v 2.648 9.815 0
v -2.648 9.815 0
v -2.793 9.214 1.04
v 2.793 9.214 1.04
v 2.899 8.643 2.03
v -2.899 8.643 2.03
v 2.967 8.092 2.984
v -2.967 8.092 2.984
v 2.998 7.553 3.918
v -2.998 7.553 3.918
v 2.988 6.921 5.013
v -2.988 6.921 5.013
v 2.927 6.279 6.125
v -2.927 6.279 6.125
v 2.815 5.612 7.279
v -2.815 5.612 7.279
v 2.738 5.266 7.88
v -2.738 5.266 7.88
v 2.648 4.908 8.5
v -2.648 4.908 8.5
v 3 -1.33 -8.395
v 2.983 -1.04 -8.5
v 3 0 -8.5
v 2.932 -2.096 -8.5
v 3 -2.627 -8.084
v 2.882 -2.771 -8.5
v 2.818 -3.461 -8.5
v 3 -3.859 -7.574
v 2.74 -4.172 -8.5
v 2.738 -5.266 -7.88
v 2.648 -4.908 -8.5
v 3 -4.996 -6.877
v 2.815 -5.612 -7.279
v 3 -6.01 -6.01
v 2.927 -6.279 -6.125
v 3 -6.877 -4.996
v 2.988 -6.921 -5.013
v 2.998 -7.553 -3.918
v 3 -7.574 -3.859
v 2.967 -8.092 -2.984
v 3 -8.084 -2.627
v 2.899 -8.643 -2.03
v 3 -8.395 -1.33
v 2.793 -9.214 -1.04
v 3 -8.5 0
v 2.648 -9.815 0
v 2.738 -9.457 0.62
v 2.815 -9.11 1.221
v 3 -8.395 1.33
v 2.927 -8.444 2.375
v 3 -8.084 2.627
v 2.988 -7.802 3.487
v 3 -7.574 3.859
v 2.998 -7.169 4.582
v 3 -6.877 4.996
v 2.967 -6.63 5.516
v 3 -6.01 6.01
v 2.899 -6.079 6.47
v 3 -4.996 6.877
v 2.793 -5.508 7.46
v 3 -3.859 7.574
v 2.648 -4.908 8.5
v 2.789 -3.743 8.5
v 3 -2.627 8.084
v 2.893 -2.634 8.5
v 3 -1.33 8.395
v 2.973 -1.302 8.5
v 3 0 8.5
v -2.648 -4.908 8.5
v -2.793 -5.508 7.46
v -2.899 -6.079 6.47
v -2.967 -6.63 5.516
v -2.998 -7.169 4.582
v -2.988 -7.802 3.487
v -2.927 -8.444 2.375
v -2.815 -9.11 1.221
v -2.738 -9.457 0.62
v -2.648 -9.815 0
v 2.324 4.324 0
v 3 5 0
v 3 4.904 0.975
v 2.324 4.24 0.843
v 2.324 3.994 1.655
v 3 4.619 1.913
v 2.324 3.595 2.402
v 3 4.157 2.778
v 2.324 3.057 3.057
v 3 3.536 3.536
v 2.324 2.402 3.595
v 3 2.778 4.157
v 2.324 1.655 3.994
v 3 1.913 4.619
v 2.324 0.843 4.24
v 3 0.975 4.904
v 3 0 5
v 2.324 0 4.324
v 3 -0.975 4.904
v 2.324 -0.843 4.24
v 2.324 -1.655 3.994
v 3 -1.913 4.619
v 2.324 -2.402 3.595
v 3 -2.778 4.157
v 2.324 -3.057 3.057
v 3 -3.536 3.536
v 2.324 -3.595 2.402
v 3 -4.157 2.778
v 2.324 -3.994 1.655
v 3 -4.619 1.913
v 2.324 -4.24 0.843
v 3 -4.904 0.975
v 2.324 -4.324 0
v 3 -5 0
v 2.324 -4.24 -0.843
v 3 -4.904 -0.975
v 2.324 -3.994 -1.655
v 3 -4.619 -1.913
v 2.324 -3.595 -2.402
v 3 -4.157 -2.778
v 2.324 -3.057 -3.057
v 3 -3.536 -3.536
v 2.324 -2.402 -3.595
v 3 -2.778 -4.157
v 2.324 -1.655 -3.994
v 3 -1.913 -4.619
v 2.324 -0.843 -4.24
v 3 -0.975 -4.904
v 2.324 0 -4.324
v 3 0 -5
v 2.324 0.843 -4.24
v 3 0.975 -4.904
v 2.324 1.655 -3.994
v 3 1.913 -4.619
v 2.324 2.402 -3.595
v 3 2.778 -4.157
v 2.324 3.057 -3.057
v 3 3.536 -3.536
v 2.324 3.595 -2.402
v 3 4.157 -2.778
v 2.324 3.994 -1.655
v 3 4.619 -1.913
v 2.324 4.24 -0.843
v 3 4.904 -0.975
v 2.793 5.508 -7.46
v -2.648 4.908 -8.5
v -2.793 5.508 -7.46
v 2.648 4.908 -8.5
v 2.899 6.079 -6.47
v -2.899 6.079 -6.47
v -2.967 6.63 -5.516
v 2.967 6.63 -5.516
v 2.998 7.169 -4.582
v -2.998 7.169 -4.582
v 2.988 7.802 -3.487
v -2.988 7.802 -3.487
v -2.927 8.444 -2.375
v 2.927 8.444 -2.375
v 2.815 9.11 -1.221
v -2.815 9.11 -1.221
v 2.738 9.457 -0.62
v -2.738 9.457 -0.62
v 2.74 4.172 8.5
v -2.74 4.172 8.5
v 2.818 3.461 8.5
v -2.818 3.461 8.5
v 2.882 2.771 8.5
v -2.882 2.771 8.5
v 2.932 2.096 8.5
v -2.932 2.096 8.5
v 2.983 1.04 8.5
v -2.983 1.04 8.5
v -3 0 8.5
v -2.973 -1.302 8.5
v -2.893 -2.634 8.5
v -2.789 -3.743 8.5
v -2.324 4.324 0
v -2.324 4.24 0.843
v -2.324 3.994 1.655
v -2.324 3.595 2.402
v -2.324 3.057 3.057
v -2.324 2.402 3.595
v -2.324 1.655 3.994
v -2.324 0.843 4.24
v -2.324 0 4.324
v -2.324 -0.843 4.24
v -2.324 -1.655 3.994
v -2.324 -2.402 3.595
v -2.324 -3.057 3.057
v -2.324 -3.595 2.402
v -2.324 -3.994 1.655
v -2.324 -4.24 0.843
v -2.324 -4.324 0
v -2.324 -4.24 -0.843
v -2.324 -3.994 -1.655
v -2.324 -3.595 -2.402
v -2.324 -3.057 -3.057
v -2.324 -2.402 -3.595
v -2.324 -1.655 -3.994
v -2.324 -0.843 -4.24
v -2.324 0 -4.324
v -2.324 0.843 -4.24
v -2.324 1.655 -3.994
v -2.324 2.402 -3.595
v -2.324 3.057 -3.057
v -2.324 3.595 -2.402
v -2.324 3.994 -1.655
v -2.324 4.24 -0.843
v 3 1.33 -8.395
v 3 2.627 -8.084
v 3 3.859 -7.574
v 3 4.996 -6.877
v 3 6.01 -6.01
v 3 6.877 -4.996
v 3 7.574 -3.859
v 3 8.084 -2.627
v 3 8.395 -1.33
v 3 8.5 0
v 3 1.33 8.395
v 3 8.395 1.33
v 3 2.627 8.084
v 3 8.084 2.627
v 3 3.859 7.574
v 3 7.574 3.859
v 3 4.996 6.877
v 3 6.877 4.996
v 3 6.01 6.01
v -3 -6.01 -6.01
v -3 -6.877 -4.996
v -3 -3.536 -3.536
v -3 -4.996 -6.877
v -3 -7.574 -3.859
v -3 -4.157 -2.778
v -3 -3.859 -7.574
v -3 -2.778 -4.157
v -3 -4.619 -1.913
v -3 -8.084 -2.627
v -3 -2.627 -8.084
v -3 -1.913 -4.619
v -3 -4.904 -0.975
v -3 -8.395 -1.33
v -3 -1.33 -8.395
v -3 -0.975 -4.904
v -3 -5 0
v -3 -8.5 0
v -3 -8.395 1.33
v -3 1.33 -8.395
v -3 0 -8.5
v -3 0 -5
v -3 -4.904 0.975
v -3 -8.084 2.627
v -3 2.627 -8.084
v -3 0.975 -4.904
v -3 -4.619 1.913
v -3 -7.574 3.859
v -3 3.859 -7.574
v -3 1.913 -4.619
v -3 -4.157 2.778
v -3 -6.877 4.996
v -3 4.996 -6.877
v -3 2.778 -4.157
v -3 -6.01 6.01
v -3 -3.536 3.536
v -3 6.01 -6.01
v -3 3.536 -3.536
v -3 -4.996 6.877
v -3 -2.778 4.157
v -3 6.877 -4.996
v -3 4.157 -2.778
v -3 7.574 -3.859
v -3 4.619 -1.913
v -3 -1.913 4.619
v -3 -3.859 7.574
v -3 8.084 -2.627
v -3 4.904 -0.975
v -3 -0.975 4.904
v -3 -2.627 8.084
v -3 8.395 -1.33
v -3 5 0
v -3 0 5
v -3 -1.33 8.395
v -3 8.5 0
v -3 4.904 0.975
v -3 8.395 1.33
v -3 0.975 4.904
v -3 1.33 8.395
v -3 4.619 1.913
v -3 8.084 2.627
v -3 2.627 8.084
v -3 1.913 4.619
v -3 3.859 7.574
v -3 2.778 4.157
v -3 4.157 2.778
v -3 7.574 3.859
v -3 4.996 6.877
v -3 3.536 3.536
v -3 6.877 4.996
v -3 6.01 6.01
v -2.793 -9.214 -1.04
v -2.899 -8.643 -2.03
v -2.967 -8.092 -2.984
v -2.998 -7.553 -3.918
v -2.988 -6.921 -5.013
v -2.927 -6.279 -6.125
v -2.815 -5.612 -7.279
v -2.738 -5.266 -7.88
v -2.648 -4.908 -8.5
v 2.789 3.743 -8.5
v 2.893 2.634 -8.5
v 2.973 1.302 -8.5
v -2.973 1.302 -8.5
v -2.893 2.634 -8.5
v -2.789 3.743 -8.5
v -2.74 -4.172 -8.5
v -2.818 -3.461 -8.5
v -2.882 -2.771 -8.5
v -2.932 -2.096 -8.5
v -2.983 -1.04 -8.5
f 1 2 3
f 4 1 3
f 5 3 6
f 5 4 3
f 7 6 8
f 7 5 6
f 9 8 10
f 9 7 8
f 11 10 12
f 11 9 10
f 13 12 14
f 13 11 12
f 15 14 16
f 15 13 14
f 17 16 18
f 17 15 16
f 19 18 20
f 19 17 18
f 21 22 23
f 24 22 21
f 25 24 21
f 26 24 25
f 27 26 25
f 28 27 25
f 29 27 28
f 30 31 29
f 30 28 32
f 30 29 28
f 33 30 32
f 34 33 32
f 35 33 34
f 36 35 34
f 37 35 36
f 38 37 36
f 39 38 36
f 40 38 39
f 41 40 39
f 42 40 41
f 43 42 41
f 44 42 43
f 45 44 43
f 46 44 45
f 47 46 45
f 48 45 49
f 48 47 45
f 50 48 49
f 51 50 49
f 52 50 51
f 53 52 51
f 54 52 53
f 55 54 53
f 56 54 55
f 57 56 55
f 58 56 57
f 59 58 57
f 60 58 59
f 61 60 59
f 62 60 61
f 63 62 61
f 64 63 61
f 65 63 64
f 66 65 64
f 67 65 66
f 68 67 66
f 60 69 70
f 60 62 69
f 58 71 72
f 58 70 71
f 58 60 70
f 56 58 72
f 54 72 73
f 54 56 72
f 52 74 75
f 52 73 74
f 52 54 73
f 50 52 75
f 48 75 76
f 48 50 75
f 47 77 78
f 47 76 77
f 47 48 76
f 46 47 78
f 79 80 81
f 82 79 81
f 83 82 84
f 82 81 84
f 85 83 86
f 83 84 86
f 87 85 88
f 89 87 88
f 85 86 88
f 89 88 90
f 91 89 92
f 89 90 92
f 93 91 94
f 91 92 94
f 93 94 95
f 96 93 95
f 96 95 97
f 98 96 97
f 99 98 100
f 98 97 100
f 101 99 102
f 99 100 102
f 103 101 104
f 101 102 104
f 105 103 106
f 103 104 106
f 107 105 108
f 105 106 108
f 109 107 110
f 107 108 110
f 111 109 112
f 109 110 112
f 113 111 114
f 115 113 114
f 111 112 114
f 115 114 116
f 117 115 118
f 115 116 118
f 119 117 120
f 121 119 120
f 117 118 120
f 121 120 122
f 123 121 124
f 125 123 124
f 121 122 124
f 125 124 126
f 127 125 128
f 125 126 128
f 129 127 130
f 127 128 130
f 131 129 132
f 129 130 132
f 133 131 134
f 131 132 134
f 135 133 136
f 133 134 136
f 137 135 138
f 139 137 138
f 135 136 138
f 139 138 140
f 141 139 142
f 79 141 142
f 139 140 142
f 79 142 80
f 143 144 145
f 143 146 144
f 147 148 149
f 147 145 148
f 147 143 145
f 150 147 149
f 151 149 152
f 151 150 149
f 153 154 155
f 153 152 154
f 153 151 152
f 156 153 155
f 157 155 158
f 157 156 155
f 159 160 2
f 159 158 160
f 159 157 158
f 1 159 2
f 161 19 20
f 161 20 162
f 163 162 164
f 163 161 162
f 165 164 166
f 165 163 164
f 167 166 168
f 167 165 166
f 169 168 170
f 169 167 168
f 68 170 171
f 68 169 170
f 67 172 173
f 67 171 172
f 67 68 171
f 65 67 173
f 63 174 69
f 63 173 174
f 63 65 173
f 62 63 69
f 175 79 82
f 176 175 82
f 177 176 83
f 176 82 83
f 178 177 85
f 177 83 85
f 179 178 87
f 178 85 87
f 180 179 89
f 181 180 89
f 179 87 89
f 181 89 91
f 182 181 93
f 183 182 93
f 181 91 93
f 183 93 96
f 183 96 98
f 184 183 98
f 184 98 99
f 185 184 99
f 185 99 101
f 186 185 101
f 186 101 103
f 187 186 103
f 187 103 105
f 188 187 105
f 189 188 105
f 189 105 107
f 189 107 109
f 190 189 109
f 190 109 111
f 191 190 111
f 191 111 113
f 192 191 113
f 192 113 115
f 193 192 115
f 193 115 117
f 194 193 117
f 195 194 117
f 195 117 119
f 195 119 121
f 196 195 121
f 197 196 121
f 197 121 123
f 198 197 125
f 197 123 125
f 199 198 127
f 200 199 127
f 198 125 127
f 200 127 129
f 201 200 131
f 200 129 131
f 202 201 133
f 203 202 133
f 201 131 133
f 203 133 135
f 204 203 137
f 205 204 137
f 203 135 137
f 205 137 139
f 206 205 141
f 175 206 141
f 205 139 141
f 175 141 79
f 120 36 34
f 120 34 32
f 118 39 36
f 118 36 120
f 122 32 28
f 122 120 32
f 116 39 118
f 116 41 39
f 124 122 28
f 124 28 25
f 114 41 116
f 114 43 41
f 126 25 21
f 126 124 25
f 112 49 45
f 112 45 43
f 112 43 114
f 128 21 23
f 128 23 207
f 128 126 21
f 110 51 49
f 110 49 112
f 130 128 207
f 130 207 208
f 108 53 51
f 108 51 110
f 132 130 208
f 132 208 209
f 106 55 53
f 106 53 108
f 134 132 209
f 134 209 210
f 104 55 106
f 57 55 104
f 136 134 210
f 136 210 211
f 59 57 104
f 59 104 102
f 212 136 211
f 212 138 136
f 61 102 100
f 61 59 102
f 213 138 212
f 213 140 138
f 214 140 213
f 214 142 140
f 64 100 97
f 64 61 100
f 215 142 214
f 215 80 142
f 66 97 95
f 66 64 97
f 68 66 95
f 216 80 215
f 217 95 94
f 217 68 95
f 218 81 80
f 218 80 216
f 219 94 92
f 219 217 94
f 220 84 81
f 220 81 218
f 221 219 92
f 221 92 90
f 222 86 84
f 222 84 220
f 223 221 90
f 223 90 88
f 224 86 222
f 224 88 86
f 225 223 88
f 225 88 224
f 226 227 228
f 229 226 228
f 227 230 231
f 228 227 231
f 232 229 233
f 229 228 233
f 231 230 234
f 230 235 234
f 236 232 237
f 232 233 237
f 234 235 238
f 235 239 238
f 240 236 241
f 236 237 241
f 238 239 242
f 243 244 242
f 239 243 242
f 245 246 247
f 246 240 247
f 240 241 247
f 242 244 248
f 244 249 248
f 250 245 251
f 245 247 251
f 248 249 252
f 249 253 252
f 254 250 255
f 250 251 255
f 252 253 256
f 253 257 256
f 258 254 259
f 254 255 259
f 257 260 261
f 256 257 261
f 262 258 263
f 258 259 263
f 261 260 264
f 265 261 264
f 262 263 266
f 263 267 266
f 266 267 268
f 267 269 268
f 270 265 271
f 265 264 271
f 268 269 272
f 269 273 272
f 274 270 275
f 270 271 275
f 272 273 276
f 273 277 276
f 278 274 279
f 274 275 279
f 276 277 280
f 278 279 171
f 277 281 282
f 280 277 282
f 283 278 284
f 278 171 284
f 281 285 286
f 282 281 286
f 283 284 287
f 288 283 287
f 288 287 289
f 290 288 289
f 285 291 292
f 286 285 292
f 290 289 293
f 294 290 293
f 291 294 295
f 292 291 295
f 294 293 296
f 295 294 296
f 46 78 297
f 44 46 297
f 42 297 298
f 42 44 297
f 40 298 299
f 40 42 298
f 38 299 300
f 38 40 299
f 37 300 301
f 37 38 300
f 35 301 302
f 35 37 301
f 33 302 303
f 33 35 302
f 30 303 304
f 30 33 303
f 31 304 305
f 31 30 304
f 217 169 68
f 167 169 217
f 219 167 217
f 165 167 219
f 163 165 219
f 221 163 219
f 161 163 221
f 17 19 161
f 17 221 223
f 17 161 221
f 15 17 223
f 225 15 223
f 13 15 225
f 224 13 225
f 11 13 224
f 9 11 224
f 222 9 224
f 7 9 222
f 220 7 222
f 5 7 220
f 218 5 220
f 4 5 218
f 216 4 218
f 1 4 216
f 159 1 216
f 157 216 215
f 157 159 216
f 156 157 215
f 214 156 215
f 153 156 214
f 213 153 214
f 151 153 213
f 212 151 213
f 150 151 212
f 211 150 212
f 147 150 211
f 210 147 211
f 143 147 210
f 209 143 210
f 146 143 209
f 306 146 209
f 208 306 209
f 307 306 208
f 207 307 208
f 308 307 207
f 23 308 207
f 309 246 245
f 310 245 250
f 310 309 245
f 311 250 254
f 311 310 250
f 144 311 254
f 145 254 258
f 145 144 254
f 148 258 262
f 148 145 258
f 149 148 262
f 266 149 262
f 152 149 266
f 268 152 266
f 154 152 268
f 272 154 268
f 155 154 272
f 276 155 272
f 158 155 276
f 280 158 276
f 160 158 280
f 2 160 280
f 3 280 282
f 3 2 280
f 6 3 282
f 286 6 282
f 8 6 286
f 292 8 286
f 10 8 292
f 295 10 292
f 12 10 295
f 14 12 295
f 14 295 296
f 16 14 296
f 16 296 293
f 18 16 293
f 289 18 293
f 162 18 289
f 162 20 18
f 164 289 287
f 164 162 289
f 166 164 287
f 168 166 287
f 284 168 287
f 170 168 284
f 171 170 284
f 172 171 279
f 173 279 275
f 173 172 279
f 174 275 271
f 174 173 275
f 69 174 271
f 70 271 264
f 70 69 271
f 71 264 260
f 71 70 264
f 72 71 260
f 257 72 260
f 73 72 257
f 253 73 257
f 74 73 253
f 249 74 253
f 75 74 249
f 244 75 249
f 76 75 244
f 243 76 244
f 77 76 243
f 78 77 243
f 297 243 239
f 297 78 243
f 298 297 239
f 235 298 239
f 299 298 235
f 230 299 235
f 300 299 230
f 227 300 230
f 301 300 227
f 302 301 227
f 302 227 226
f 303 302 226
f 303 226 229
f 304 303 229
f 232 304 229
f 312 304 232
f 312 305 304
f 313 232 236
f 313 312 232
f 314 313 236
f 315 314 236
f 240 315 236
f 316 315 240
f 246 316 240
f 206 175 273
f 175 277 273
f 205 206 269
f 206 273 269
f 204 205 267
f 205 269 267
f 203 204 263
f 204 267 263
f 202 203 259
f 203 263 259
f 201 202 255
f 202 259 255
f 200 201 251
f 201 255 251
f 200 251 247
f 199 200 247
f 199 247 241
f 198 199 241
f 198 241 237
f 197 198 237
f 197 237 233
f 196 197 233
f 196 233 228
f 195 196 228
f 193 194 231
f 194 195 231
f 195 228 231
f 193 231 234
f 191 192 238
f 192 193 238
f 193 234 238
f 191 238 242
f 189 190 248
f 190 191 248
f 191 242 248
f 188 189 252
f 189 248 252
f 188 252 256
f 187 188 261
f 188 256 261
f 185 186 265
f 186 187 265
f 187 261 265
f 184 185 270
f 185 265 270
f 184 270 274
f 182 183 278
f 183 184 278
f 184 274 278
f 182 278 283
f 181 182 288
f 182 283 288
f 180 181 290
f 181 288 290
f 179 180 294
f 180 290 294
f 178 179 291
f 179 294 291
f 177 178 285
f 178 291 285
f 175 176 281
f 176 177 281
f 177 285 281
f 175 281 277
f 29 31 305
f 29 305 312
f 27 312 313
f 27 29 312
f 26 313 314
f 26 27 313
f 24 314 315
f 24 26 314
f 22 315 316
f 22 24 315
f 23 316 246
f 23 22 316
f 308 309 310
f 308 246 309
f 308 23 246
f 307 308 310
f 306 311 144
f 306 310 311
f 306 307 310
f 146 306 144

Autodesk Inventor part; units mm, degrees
sketch "Sketch_1" plane through (0, 0, 0) normal (0, 0, 1) x (1, 0, 0)
  line L0 (3, 0) -> (-3, 0)
  line L1 (-3, 8.5) -> (-3, 5)
  line L2 (-3, 5) -> (-2.3235, 4.3235)
  line L3 (-2.3235, 4.3235) -> (2.3235, 4.3235)
  line L4 (2.3235, 4.3235) -> (3, 5)
  line L5 (3, 5) -> (3, 8.5)
  line L6 (3, 8.5) -> (1.6335, 13.6)
  line L7 (1.6335, 13.6) -> (-1.6335, 13.6)
  line L8 (-1.6335, 13.6) -> (-3, 8.5)
revolve "Revolution1" add sketch "Sketch_1" angle 360 about axis through (3, 0, 0) along (1, 0, 0)
thread "Thread1" size "M10x1.25" class "6H" standard "ISO Metric profile" full length
sketch "Sketch_2" plane through (0, 0, 0) normal (1, 0, 0) x (0, 1, 0)
  circle A0 centre (0, 0) radius 17
  line L0 (-4.9075, 8.5) -> (-9.815, 0)
  line L1 (-9.815, 0) -> (-4.9075, -8.5)
  line L2 (-4.9075, -8.5) -> (4.9075, -8.5)
  line L3 (4.9075, -8.5) -> (9.815, 0)
  line L4 (9.815, 0) -> (4.9075, 8.5)
  line L5 (4.9075, 8.5) -> (-4.9075, 8.5)
extrude "Extrusion1" cut sketch "Sketch_2" along normal mid plane 12
ref_plane "NUT_ROD_XY" through (0, 0, 0) normal (1, 0, 0) x (0, 0, -1)
ref_plane "NUT_ROD_YZ" through (0, 0, 0) normal (0, 0, -1) x (0, 1, 0)
ref_plane "NUT_ROD_ZX" through (0, 0, 0) normal (0, 1, 0) x (1, 0, 0)
properties part number "NT-03_CQS"
